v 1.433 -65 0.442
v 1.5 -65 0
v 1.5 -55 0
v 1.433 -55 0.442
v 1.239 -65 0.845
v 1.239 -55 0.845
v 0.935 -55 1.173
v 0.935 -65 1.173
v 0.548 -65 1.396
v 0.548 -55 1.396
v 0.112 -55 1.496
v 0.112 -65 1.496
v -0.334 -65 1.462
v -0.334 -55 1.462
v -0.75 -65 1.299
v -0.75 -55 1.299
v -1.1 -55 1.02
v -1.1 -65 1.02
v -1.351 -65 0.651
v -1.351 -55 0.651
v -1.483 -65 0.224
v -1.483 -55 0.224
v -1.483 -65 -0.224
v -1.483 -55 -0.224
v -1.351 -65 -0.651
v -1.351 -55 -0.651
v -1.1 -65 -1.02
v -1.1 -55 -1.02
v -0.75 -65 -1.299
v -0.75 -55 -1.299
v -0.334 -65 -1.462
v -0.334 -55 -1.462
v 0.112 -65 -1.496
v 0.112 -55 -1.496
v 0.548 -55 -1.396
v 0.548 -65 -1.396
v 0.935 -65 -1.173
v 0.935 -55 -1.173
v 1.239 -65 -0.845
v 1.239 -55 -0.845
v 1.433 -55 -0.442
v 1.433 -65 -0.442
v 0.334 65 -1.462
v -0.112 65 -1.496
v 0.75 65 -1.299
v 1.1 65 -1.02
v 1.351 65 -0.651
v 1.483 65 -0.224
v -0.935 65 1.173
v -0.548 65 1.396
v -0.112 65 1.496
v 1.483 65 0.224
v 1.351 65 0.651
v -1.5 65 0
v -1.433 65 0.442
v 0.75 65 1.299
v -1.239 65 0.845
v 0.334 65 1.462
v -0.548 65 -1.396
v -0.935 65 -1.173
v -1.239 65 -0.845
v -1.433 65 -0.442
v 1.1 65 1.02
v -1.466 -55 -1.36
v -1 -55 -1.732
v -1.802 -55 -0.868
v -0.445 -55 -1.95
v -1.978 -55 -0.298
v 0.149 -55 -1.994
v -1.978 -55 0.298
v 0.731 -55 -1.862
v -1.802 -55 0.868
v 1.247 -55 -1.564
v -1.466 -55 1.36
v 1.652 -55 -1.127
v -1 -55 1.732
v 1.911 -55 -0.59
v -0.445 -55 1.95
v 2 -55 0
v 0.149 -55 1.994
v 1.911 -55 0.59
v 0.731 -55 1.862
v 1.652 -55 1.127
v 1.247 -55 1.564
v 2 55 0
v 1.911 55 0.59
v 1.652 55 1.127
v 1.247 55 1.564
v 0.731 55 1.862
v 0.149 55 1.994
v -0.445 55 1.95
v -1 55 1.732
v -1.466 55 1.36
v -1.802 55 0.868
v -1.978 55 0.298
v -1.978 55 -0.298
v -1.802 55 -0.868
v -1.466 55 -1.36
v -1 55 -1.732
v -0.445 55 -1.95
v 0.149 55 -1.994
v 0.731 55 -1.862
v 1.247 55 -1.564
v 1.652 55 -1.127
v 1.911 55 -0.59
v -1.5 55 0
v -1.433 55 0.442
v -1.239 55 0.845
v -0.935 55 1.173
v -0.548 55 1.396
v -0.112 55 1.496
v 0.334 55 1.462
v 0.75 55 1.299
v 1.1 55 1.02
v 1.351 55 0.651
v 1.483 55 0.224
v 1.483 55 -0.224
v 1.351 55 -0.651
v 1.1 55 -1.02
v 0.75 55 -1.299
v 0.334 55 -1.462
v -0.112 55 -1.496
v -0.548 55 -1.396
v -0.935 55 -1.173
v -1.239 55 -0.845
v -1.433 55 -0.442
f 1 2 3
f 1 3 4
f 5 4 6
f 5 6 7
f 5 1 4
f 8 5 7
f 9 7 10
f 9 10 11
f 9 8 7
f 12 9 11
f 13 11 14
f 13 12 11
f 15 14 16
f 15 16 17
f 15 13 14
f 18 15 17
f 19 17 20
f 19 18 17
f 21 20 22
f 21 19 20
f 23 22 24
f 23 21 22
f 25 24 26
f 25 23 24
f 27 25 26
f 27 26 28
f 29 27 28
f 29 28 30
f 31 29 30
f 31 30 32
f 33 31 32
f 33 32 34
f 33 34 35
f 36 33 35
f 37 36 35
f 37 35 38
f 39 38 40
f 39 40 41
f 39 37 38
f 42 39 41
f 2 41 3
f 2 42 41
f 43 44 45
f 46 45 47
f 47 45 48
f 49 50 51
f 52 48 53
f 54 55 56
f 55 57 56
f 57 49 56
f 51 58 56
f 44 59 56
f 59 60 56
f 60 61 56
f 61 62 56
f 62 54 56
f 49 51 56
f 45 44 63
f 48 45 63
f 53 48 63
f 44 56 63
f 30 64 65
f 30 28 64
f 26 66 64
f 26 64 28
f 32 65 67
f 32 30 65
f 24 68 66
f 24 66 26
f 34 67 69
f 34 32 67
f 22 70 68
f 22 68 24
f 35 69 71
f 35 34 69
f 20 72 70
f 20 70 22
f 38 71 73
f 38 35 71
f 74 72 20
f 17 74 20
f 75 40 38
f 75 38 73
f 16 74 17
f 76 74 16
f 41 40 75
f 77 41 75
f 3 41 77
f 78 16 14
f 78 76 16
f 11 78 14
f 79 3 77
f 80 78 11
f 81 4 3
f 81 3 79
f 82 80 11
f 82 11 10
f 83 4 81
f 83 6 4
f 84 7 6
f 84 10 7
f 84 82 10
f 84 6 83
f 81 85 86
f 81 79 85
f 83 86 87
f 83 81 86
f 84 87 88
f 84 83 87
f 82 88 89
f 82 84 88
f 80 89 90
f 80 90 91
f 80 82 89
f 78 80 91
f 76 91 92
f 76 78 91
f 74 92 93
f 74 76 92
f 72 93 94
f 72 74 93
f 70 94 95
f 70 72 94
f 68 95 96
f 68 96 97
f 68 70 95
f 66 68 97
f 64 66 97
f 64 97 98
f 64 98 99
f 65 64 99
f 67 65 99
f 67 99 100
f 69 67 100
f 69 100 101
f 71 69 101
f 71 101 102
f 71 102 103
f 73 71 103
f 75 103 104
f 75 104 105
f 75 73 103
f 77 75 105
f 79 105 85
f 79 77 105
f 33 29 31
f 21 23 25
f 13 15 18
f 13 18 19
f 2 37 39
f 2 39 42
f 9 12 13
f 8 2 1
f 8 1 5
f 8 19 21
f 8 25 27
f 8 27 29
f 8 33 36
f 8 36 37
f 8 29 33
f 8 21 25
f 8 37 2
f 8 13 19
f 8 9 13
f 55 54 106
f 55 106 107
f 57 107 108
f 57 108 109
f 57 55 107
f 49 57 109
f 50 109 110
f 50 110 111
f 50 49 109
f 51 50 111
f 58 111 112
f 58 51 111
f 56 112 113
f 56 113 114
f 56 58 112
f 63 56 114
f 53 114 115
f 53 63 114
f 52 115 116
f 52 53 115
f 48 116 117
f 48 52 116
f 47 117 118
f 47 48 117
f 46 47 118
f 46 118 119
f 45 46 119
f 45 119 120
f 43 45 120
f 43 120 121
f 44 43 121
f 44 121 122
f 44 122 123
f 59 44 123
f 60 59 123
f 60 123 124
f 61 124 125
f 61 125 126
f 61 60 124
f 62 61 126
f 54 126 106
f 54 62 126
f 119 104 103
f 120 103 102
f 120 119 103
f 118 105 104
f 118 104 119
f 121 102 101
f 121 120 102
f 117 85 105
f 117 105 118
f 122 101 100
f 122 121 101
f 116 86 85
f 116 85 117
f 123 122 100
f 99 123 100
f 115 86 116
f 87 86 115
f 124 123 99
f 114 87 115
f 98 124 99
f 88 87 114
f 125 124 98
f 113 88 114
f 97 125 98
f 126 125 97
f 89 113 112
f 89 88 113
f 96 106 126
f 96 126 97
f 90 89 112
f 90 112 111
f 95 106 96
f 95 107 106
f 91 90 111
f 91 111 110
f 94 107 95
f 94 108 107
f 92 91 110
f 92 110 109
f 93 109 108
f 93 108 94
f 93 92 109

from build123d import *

# Parameters (mm, degrees)
F0_R     = 2
F1_DEPTH = 65
F2_R     = 2
F2_R_2   = 1.5
F3_DEPTH = 10
F4_R     = 2
F4_R_2   = 1.5
F5_DEPTH = 10


with BuildPart() as f1:
    # F0 (on Front) → F1 (new body, symmetric)
    with BuildSketch(Plane.XZ):
        Circle(F0_R)
    extrude(amount=F1_DEPTH, both=True)

    # F2 (on face) → F3 (cut)
    with BuildSketch(Plane.XZ.offset(65)):
        Circle(F2_R)
        Circle(F2_R_2, mode=Mode.SUBTRACT)
    extrude(amount=-F3_DEPTH, mode=Mode.SUBTRACT)

    # F4 (on face) → F5 (cut)
    with BuildSketch(Plane(origin=(0, 65, 0), x_dir=(-1, 0, 0), z_dir=(0, 1, 0))):
        Circle(F4_R)
        Circle(F4_R_2, mode=Mode.SUBTRACT)
    extrude(amount=-F5_DEPTH, mode=Mode.SUBTRACT)


solid = f1.part
